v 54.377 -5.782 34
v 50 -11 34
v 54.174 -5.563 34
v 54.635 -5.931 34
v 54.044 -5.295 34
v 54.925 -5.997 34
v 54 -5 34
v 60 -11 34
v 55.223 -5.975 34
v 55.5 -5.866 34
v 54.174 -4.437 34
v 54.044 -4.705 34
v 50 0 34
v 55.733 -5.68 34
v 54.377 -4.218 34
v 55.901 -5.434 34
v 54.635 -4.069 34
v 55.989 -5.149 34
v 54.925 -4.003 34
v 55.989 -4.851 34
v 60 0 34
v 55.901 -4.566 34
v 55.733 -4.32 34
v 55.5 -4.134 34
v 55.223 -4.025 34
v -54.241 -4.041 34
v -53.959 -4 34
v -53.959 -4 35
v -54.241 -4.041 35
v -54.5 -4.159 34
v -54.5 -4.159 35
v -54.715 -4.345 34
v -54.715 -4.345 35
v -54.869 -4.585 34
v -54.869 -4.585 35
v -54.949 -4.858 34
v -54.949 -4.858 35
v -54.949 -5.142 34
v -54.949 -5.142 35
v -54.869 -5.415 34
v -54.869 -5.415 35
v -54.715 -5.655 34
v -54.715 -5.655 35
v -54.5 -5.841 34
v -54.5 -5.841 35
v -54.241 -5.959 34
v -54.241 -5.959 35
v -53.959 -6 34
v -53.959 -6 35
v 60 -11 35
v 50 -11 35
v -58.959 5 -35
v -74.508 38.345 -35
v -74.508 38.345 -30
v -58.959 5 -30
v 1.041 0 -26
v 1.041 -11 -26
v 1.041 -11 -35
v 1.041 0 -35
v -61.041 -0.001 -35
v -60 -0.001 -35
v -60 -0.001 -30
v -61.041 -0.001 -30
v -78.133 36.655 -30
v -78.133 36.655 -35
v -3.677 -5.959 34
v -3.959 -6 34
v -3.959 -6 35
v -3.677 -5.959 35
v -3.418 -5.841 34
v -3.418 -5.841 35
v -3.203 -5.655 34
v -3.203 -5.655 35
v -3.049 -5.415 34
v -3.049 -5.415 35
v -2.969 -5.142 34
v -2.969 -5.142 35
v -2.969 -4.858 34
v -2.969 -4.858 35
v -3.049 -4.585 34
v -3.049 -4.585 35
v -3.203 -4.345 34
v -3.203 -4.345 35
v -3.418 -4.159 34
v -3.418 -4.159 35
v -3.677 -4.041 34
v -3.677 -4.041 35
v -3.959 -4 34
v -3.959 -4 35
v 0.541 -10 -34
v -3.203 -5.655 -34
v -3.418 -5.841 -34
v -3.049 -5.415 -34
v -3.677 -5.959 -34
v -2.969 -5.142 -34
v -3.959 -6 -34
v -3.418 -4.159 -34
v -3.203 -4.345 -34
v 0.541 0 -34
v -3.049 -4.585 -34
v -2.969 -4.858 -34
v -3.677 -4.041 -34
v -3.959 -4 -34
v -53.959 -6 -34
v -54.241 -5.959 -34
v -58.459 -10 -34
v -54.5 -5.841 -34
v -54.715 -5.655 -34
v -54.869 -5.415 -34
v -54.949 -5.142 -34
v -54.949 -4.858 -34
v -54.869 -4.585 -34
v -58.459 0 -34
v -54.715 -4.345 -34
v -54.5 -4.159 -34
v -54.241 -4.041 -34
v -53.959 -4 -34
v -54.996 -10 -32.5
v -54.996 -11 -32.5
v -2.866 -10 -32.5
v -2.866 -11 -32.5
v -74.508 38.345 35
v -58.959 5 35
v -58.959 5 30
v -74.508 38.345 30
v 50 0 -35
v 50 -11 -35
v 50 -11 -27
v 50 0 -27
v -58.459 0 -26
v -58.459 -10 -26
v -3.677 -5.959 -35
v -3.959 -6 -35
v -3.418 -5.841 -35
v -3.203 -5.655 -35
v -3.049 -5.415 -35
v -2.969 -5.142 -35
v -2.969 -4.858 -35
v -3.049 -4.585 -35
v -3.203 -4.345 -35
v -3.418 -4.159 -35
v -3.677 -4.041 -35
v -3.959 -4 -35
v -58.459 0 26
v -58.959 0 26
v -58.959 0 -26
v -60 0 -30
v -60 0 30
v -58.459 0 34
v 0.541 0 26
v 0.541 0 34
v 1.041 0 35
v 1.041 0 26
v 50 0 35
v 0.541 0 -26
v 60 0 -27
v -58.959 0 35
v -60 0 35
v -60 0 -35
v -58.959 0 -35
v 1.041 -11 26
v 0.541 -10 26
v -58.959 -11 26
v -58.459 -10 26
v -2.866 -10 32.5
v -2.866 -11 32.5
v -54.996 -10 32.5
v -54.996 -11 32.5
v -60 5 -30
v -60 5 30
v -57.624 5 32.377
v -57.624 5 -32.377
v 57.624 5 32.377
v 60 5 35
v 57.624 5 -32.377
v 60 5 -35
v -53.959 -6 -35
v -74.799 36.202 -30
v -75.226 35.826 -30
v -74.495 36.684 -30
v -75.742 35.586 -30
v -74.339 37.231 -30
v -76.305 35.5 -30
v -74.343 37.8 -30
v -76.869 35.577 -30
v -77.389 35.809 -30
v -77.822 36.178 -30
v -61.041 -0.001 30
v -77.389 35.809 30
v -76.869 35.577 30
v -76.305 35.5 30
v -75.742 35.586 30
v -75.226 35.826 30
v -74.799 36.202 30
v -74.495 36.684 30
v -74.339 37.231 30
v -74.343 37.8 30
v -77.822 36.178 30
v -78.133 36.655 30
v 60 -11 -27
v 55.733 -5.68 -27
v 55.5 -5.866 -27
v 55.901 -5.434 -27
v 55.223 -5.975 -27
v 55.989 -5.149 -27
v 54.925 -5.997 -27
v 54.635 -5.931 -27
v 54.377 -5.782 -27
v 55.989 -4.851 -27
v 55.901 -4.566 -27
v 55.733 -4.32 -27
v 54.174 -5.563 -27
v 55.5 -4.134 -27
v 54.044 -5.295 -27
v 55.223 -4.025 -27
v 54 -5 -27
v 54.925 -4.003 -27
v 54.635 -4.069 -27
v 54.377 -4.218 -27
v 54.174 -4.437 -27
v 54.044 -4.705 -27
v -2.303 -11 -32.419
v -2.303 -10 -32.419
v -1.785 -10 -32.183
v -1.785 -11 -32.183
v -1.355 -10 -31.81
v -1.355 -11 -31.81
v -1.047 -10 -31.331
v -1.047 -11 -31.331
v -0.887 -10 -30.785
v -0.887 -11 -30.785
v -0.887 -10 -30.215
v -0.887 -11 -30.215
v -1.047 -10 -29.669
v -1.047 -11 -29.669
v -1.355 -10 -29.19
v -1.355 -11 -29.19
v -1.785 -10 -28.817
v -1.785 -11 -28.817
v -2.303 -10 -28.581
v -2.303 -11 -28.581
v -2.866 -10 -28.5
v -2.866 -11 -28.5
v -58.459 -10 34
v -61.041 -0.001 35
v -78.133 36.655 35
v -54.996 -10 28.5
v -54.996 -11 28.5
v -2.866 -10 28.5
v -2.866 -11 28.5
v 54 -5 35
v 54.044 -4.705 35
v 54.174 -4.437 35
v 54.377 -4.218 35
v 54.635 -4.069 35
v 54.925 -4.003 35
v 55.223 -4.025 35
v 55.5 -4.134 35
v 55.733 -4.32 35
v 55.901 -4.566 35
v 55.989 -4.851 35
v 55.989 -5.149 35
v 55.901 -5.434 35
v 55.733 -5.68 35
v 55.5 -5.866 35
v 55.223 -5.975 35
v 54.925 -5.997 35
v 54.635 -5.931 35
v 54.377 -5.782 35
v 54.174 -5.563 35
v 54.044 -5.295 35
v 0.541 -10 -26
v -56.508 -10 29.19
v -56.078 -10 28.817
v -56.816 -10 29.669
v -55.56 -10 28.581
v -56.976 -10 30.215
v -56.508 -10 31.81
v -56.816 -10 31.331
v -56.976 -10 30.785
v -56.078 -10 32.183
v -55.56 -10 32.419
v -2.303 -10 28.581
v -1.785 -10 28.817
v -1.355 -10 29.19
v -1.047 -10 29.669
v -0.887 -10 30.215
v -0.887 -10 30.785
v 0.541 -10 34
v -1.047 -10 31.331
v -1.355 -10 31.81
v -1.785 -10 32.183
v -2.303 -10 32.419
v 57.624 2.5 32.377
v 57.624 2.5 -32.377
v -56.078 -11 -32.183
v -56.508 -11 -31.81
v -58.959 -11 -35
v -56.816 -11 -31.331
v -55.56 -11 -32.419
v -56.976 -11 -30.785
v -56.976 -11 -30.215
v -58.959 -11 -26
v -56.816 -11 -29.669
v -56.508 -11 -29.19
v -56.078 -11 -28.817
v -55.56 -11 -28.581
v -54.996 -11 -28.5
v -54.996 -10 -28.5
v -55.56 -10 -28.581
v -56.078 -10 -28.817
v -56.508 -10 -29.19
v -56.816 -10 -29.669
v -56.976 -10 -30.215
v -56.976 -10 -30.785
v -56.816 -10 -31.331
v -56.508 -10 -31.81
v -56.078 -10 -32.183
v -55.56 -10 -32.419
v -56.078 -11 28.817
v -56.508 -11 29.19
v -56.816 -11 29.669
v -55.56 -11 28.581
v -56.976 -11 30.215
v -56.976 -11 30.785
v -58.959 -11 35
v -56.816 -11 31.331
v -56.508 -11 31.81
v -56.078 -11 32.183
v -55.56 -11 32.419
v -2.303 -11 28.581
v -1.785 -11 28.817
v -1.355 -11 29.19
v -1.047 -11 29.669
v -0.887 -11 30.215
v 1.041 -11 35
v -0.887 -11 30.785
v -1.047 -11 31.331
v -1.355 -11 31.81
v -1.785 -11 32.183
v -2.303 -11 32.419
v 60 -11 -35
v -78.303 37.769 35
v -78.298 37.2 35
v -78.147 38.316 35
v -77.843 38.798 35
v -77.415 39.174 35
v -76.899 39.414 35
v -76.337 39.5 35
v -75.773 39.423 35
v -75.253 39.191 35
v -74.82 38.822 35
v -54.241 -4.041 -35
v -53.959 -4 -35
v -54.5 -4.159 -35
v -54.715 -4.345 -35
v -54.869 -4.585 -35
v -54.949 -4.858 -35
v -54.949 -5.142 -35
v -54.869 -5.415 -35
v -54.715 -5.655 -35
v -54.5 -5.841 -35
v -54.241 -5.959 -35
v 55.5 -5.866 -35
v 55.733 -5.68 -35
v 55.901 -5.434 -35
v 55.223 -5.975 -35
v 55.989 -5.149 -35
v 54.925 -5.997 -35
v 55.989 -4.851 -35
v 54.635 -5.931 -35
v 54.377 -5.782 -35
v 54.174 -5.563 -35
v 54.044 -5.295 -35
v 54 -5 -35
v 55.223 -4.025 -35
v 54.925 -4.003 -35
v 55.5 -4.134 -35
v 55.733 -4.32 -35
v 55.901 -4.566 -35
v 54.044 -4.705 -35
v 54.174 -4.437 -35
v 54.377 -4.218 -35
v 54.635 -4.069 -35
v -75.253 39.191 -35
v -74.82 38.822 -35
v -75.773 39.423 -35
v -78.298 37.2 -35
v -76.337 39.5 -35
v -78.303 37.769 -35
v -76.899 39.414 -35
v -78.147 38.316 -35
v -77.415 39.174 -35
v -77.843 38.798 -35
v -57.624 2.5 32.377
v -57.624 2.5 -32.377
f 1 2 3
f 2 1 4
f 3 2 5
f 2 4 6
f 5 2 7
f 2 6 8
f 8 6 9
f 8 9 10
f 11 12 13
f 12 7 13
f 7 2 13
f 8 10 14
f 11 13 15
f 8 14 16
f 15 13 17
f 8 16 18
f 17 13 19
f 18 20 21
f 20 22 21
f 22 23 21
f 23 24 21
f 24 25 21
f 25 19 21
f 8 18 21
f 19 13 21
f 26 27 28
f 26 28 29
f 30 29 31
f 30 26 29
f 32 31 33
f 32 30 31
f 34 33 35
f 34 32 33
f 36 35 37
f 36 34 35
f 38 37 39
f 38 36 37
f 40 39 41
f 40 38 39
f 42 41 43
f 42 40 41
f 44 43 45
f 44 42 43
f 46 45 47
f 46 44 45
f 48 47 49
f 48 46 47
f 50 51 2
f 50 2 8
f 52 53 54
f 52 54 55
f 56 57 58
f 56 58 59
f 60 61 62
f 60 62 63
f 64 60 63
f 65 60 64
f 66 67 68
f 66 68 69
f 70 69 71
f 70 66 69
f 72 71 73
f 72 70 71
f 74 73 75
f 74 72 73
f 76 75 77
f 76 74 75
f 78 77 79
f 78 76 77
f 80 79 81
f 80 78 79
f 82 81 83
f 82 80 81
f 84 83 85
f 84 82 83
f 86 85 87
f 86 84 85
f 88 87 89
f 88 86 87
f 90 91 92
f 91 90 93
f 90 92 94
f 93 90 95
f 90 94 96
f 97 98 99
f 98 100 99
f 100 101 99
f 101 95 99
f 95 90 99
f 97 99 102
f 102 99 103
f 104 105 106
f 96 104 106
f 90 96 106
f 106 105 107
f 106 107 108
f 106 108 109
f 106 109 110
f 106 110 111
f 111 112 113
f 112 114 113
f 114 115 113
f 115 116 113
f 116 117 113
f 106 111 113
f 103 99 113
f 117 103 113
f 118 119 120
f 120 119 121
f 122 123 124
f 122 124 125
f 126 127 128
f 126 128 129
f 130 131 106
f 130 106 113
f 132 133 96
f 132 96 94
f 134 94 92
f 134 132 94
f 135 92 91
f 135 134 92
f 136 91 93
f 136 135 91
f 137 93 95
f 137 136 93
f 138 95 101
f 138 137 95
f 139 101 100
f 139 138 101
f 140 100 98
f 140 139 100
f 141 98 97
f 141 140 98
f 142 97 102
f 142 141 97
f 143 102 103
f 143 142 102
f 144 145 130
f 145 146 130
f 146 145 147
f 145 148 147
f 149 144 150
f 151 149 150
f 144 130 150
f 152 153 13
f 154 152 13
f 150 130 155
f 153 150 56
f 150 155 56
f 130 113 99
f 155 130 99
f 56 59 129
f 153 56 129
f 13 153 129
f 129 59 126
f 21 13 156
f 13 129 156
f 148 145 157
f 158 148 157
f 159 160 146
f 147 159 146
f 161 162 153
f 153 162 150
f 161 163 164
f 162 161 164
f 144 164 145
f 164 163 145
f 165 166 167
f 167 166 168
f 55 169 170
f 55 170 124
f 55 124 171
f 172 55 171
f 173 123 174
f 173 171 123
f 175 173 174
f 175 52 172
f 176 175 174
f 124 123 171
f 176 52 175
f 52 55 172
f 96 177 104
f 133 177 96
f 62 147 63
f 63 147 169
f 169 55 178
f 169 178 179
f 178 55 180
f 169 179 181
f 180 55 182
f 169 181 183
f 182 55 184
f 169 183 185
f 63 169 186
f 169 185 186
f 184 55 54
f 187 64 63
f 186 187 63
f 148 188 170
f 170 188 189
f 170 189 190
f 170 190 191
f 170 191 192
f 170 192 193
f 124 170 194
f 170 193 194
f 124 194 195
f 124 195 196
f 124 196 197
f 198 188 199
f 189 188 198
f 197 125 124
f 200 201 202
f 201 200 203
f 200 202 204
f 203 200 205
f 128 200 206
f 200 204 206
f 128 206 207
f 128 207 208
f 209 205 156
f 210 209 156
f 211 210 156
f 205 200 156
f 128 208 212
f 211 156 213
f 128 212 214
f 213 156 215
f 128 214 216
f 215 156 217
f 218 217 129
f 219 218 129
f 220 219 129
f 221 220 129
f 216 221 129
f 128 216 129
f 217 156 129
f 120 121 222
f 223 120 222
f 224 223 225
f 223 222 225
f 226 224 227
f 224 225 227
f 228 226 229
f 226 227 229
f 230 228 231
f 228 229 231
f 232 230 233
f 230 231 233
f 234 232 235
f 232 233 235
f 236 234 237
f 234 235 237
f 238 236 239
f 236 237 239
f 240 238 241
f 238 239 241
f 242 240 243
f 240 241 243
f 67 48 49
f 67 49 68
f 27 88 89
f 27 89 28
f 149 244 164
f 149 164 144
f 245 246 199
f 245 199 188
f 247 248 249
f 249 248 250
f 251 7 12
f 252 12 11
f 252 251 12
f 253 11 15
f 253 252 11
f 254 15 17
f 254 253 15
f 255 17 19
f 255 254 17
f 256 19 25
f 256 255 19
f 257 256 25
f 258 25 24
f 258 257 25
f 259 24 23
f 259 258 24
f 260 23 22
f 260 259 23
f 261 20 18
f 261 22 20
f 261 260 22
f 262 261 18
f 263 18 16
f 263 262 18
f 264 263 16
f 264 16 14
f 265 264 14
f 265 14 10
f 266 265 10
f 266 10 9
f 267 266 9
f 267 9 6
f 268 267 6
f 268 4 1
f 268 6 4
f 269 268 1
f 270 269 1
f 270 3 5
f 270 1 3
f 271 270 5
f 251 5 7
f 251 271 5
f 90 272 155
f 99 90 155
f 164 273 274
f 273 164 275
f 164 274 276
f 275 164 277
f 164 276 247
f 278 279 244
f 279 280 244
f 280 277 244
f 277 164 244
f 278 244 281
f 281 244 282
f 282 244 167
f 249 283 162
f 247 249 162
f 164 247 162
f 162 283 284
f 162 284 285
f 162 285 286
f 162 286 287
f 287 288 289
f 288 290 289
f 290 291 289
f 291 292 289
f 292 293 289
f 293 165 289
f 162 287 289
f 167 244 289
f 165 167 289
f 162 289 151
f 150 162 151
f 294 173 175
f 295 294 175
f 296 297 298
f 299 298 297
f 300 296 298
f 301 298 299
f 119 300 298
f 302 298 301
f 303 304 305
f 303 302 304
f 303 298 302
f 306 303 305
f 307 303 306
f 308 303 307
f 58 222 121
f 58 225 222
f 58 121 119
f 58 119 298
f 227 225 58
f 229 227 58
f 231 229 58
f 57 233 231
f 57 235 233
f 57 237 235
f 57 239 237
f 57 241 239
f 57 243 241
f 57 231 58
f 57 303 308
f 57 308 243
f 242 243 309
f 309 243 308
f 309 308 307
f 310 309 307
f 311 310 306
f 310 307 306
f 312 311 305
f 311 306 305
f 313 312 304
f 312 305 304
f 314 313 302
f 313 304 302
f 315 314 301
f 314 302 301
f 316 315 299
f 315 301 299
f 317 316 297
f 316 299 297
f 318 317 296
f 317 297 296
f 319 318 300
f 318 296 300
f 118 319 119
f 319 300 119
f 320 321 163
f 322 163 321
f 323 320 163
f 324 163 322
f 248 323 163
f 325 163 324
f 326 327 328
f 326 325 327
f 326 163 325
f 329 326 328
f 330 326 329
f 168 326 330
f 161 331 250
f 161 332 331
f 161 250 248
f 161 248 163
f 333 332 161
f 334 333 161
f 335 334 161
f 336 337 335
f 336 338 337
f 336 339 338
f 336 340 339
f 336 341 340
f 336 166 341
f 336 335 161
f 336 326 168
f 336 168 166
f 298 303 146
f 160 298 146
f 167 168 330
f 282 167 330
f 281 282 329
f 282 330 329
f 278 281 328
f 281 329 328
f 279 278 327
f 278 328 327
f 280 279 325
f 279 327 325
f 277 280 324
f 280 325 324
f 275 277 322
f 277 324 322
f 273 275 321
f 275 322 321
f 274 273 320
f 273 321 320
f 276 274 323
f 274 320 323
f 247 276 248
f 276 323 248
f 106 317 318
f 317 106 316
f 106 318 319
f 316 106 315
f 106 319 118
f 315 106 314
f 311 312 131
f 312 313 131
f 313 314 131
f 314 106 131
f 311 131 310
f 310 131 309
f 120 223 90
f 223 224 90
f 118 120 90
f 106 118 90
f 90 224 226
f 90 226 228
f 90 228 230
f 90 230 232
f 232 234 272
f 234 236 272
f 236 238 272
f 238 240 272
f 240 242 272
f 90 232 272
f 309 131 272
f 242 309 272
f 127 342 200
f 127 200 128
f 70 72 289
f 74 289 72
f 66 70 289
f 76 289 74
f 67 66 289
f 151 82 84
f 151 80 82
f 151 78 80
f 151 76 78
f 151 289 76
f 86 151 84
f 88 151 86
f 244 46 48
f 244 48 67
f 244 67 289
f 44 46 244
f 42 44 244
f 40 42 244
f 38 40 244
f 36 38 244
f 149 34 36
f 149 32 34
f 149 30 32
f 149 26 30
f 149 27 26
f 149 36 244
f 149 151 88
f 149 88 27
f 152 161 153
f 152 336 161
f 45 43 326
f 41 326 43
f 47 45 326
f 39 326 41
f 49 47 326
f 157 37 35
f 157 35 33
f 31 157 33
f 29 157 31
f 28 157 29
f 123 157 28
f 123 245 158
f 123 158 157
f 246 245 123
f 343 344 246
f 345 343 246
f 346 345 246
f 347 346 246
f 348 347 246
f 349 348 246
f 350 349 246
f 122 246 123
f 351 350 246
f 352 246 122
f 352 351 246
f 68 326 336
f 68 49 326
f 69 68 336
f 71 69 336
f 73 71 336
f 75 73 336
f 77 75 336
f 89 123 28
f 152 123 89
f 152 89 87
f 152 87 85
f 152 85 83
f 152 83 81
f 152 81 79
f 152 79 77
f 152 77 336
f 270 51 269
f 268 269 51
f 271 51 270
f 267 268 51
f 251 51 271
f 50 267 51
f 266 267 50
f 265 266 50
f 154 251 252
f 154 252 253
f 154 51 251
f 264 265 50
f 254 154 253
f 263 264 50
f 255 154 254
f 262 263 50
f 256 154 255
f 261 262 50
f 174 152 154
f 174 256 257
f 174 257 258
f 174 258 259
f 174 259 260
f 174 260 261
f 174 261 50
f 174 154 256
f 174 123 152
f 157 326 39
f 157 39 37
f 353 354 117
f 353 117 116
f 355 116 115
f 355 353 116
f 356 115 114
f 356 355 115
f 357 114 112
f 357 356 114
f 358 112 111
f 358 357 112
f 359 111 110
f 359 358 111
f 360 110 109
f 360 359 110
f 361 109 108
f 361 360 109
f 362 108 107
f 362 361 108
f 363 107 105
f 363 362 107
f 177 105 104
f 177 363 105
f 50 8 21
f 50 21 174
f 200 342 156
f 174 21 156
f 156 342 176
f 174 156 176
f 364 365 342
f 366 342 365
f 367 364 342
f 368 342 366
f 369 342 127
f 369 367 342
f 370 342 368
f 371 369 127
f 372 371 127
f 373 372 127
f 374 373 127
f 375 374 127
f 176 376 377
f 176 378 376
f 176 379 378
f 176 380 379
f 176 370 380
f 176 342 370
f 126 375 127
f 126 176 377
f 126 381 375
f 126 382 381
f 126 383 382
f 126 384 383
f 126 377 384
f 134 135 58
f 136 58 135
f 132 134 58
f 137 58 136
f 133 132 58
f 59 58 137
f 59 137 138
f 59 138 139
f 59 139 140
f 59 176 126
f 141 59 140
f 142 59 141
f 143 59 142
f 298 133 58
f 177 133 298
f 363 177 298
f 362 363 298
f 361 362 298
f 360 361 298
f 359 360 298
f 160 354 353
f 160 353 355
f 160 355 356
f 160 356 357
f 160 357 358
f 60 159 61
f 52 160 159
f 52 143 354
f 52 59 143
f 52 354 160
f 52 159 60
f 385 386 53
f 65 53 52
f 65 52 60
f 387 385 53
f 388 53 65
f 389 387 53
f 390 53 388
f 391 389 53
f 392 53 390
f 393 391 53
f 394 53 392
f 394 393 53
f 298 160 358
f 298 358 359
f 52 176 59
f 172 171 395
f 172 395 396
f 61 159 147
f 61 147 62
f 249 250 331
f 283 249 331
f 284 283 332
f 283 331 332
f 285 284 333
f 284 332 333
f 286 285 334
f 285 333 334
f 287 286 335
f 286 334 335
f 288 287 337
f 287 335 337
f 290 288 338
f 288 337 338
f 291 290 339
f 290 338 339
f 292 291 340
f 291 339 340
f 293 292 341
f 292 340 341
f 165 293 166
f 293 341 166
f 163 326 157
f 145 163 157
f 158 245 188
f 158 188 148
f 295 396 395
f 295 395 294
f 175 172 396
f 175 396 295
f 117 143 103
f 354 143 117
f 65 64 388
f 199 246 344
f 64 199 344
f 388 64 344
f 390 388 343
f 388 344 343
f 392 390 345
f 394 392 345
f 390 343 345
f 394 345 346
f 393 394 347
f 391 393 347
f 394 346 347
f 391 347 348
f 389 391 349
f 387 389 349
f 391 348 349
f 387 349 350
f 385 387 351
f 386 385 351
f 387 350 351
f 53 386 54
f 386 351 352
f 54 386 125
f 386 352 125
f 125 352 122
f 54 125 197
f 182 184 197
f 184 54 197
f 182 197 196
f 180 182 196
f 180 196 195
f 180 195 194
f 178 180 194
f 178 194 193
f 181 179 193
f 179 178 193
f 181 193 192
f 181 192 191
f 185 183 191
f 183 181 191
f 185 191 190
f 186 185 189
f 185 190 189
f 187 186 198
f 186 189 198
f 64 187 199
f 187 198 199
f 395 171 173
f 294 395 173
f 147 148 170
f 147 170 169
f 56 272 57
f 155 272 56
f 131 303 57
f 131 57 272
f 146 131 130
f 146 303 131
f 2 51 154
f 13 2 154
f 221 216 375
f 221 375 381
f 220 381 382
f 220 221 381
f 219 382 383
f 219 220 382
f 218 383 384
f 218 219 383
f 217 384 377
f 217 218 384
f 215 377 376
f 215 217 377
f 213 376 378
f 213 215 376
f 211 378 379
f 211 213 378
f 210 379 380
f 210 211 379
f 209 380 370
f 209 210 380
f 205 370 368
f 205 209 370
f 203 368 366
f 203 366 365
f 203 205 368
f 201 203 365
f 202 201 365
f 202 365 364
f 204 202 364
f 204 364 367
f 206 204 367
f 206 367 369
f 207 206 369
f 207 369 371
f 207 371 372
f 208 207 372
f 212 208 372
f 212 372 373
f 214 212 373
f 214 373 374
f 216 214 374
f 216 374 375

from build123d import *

# Parameters (mm, degrees)
SKETCH1_W            = 120
SKETCH1_H            = 70
BOSS_EXTRUDE1_DEPTH  = 5
BOSS_EXTRUDE4_DEPTH  = 5
BOSS_EXTRUDE5_DEPTH  = 5
BOSS_EXTRUDE7_START  = -70
SKETCH7_R            = 2
BOSS_EXTRUDE7_DEPTH  = 70
SKETCH8_W            = 115.247199032
SKETCH8_H            = 64.754368984
CUT_EXTRUDE1_DEPTH   = 2.5
SKETCH13_W           = 10
SKETCH13_H           = 10
BOSS_EXTRUDE8_DEPTH  = 1
SKETCH14_W           = 10
SKETCH14_H           = 10
BOSS_EXTRUDE9_DEPTH  = 1
SKETCH15_W           = 60
SKETCH15_H           = 10
BOSS_EXTRUDE12_DEPTH = 1
CUT_EXTRUDE2_REACH   = 114.225
CUT_EXTRUDE3_START   = -70
SKETCH17_R           = 1
CUT_EXTRUDE3_DEPTH   = 70
SKETCH18_W           = 60
SKETCH18_H           = 9
BOSS_EXTRUDE15_DEPTH = 1
THICKEN1_START       = 0.540986693
THICKEN1_OUTLINE_W   = 10
THICKEN1_OUTLINE_H   = 8
THICKEN1_DEPTH       = 0.5
THICKEN2_START       = -58.959013307
THICKEN2_OUTLINE_W   = 10
THICKEN2_OUTLINE_H   = 8
THICKEN2_DEPTH       = 0.5
THICKEN3_START       = -58.959013307
THICKEN3_OUTLINE_W   = 10
THICKEN3_OUTLINE_H   = 8
THICKEN3_DEPTH       = 0.5
THICKEN4_START       = 0.540986693
THICKEN4_OUTLINE_W   = 10
THICKEN4_OUTLINE_H   = 8
THICKEN4_DEPTH       = 0.5
SKETCH22_W           = 10
SKETCH22_H           = 1
BOSS_EXTRUDE16_DEPTH = 1
SKETCH23_W           = 10
SKETCH23_H           = 1
BOSS_EXTRUDE17_DEPTH = 1
CUT_EXTRUDE4_DEPTH   = 5
SKETCH28_W           = 10
SKETCH28_H           = 11
BOSS_EXTRUDE18_DEPTH = 8
CUT_EXTRUDE5_START   = -23
SKETCH29_R           = 1
CUT_EXTRUDE5_DEPTH   = 23


# Read off the part's stored shape, not the designer's step: Thicken1, Thicken2, Thicken3, Thicken4
with BuildPart() as part:
    # Sketch1 → Boss-Extrude1 (new body)
    with BuildSketch(Plane(origin=(0, 0, 0), x_dir=(1, 0, 0), z_dir=(0, 1, 0))):
        Rectangle(SKETCH1_W, SKETCH1_H)
    extrude(amount=BOSS_EXTRUDE1_DEPTH)

    # Sketch2 → Boss-Extrude4 (add)
    with BuildSketch(Plane(origin=(0, 0, -35), x_dir=(-1, 0, 0), z_dir=(0, 0, -1))):
        Polygon((74.508152461, 38.345236523), (58.959013307, 5), (60, 5), (60, -0.000631219), (61.04069235, -0.000631219), (78.133383609, 36.654763477), align=None)
    extrude(amount=-BOSS_EXTRUDE4_DEPTH)

    # Sketch6 → Boss-Extrude5 (add)
    with BuildSketch(Plane.XY.offset(35)):
        Polygon((-61.04069235, -0.000631219), (-60, 0), (-60, 5), (-58.959013307, 5), (-74.508152461, 38.345236523), (-78.133383609, 36.654763477), align=None)
    extrude(amount=-BOSS_EXTRUDE5_DEPTH)

    # Sketch7 → Boss-Extrude7 (add)
    with BuildSketch(Plane(origin=(0, 0, -35), x_dir=(-1, 0, 0), z_dir=(0, 0, -1)).offset(BOSS_EXTRUDE7_START)):
        with Locations(Location((76.320768035, 37.5, 0), (0, 0, 335))):
            Circle(SKETCH7_R)
    extrude(amount=BOSS_EXTRUDE7_DEPTH)

    # Sketch8 → Cut-Extrude1 (cut)
    with BuildSketch(Plane(origin=(0, 5, 0), x_dir=(1, 0, 0), z_dir=(0, 1, 0))):
        Rectangle(SKETCH8_W, SKETCH8_H)
    extrude(amount=-CUT_EXTRUDE1_DEPTH, mode=Mode.SUBTRACT)

    # Sketch13 → Boss-Extrude8 (add)
    with BuildSketch(Plane(origin=(0, 0, -35), x_dir=(-1, 0, 0), z_dir=(0, 0, -1))):
        with Locations((-55, -5)):
            Rectangle(SKETCH13_W, SKETCH13_H)
    extrude(amount=-BOSS_EXTRUDE8_DEPTH)

    # Sketch14 → Boss-Extrude9 (add)
    with BuildSketch(Plane.XY.offset(35)):
        with Locations((55, -5)):
            Rectangle(SKETCH14_W, SKETCH14_H)
    extrude(amount=-BOSS_EXTRUDE9_DEPTH)

    # Sketch15 → Boss-Extrude12 (add)
    with BuildSketch(Plane(origin=(0, 0, -35), x_dir=(-1, 0, 0), z_dir=(0, 0, -1))):
        with Locations((28.959013307, -5)):
            Rectangle(SKETCH15_W, SKETCH15_H)
    boss_extrude12 = extrude(amount=-BOSS_EXTRUDE12_DEPTH)

    # Mirror1: Boss-Extrude12 across plane
    add(boss_extrude12.mirror(Plane.XY))

    # Cut-Extrude2: up to this face of the body (flat: up to its plane)
    cut_extrude2_end = Plane(part.part.faces().sort_by_distance((-15.670325555, 0.904669602, 35))[0])
    # Sketch16 → Cut-Extrude2 (cut, up to the picked face)
    with BuildSketch(Plane(origin=(0, 0, -35), x_dir=(-1, 0, 0), z_dir=(0, 0, -1)), mode=Mode.PRIVATE) as cut_extrude2_sk1:
        with BuildLine():
            Line((3.959013307, -4), (53.959013307, -4))
            ThreePointArc((53.959013307, -4), (54.959013307, -5), (53.959013307, -6))
            Line((53.959013307, -6), (3.959013307, -6))
            ThreePointArc((3.959013307, -6), (2.959013307, -5), (3.959013307, -4))
        make_face()
    cut_extrude2_tool1 = split(extrude(cut_extrude2_sk1.sketch, amount=-CUT_EXTRUDE2_REACH, mode=Mode.PRIVATE), bisect_by=cut_extrude2_end, keep=Keep.BOTH, mode=Mode.PRIVATE)
    add(cut_extrude2_tool1.solids().sort_by(Axis((-28.959013, -5, -35), (0, 0, 1)))[0], mode=Mode.SUBTRACT)

    # Sketch17 → Cut-Extrude3 (cut)
    with BuildSketch(Plane(origin=(0, 0, -35), x_dir=(-1, 0, 0), z_dir=(0, 0, -1)).offset(CUT_EXTRUDE3_START)):
        with Locations((-55, -5)):
            Circle(SKETCH17_R)
    extrude(amount=CUT_EXTRUDE3_DEPTH, mode=Mode.SUBTRACT)

    # Sketch18 → Boss-Extrude15 (add)
    with BuildSketch(Plane.XZ.offset(10)):
        with Locations((-28.959013307, 30.5)):
            Rectangle(SKETCH18_W, SKETCH18_H)
        with Locations((-28.959013307, -30.5)):
            Rectangle(SKETCH18_W, SKETCH18_H)
    extrude(amount=BOSS_EXTRUDE15_DEPTH)

    # Thicken1 outline → Thicken1 (add)
    with BuildSketch(Plane.YZ.offset(THICKEN1_START)):
        with Locations((-5, 30)):
            Rectangle(THICKEN1_OUTLINE_W, THICKEN1_OUTLINE_H)
    extrude(amount=THICKEN1_DEPTH)

    # Thicken2 outline → Thicken2 (add)
    with BuildSketch(Plane.YZ.offset(THICKEN2_START)):
        with Locations((-5, -30)):
            Rectangle(THICKEN2_OUTLINE_W, THICKEN2_OUTLINE_H)
    extrude(amount=THICKEN2_DEPTH)

    # Thicken3 outline → Thicken3 (add)
    with BuildSketch(Plane.YZ.offset(THICKEN3_START)):
        with Locations((-5, 30)):
            Rectangle(THICKEN3_OUTLINE_W, THICKEN3_OUTLINE_H)
    extrude(amount=THICKEN3_DEPTH)

    # Thicken4 outline → Thicken4 (add)
    with BuildSketch(Plane.YZ.offset(THICKEN4_START)):
        with Locations((-5, -30)):
            Rectangle(THICKEN4_OUTLINE_W, THICKEN4_OUTLINE_H)
    extrude(amount=THICKEN4_DEPTH)

    # Sketch22 → Boss-Extrude16 (add)
    with BuildSketch(Plane.XY.offset(35)):
        with Locations((55, -10.5)):
            Rectangle(SKETCH22_W, SKETCH22_H)
    extrude(amount=-BOSS_EXTRUDE16_DEPTH)

    # Sketch23 → Boss-Extrude17 (add)
    with BuildSketch(Plane(origin=(0, 0, -35), x_dir=(-1, 0, 0), z_dir=(0, 0, -1))):
        with Locations((-55, -10.5)):
            Rectangle(SKETCH23_W, SKETCH23_H)
    extrude(amount=-BOSS_EXTRUDE17_DEPTH)

    # Sketch25 → Cut-Extrude4 (cut)
    with BuildSketch(Plane.XZ.offset(11)):
        with BuildLine():
            Line((-2.866454916, 32.5), (-54.996437016, 32.5))
            ThreePointArc((-54.996437016, 32.5), (-56.996437016, 30.5), (-54.996437016, 28.5))
            Line((-54.996437016, 28.5), (-2.866454916, 28.5))
            ThreePointArc((-2.866454916, 28.5), (-0.866454916, 30.5), (-2.866454916, 32.5))
        make_face()
        with BuildLine():
            Line((-2.866454916, -28.5), (-54.996437016, -28.5))
            ThreePointArc((-54.996437016, -28.5), (-56.996437016, -30.5), (-54.996437016, -32.5))
            Line((-54.996437016, -32.5), (-2.866454916, -32.5))
            ThreePointArc((-2.866454916, -32.5), (-0.866454916, -30.5), (-2.866454916, -28.5))
        make_face()
    extrude(amount=-CUT_EXTRUDE4_DEPTH, mode=Mode.SUBTRACT)

    # Sketch28 → Boss-Extrude18 (add)
    with BuildSketch(Plane(origin=(0, 0, -35), x_dir=(-1, 0, 0), z_dir=(0, 0, -1))):
        with Locations((-55, -5.5)):
            Rectangle(SKETCH28_W, SKETCH28_H)
    extrude(amount=-BOSS_EXTRUDE18_DEPTH)

    # Sketch29 → Cut-Extrude5 (cut)
    with BuildSketch(Plane(origin=(0, 0, -35), x_dir=(-1, 0, 0), z_dir=(0, 0, -1)).offset(CUT_EXTRUDE5_START)):
        with Locations((-55, -5)):
            Circle(SKETCH29_R)
    extrude(amount=CUT_EXTRUDE5_DEPTH, mode=Mode.SUBTRACT)


solid = part.part
